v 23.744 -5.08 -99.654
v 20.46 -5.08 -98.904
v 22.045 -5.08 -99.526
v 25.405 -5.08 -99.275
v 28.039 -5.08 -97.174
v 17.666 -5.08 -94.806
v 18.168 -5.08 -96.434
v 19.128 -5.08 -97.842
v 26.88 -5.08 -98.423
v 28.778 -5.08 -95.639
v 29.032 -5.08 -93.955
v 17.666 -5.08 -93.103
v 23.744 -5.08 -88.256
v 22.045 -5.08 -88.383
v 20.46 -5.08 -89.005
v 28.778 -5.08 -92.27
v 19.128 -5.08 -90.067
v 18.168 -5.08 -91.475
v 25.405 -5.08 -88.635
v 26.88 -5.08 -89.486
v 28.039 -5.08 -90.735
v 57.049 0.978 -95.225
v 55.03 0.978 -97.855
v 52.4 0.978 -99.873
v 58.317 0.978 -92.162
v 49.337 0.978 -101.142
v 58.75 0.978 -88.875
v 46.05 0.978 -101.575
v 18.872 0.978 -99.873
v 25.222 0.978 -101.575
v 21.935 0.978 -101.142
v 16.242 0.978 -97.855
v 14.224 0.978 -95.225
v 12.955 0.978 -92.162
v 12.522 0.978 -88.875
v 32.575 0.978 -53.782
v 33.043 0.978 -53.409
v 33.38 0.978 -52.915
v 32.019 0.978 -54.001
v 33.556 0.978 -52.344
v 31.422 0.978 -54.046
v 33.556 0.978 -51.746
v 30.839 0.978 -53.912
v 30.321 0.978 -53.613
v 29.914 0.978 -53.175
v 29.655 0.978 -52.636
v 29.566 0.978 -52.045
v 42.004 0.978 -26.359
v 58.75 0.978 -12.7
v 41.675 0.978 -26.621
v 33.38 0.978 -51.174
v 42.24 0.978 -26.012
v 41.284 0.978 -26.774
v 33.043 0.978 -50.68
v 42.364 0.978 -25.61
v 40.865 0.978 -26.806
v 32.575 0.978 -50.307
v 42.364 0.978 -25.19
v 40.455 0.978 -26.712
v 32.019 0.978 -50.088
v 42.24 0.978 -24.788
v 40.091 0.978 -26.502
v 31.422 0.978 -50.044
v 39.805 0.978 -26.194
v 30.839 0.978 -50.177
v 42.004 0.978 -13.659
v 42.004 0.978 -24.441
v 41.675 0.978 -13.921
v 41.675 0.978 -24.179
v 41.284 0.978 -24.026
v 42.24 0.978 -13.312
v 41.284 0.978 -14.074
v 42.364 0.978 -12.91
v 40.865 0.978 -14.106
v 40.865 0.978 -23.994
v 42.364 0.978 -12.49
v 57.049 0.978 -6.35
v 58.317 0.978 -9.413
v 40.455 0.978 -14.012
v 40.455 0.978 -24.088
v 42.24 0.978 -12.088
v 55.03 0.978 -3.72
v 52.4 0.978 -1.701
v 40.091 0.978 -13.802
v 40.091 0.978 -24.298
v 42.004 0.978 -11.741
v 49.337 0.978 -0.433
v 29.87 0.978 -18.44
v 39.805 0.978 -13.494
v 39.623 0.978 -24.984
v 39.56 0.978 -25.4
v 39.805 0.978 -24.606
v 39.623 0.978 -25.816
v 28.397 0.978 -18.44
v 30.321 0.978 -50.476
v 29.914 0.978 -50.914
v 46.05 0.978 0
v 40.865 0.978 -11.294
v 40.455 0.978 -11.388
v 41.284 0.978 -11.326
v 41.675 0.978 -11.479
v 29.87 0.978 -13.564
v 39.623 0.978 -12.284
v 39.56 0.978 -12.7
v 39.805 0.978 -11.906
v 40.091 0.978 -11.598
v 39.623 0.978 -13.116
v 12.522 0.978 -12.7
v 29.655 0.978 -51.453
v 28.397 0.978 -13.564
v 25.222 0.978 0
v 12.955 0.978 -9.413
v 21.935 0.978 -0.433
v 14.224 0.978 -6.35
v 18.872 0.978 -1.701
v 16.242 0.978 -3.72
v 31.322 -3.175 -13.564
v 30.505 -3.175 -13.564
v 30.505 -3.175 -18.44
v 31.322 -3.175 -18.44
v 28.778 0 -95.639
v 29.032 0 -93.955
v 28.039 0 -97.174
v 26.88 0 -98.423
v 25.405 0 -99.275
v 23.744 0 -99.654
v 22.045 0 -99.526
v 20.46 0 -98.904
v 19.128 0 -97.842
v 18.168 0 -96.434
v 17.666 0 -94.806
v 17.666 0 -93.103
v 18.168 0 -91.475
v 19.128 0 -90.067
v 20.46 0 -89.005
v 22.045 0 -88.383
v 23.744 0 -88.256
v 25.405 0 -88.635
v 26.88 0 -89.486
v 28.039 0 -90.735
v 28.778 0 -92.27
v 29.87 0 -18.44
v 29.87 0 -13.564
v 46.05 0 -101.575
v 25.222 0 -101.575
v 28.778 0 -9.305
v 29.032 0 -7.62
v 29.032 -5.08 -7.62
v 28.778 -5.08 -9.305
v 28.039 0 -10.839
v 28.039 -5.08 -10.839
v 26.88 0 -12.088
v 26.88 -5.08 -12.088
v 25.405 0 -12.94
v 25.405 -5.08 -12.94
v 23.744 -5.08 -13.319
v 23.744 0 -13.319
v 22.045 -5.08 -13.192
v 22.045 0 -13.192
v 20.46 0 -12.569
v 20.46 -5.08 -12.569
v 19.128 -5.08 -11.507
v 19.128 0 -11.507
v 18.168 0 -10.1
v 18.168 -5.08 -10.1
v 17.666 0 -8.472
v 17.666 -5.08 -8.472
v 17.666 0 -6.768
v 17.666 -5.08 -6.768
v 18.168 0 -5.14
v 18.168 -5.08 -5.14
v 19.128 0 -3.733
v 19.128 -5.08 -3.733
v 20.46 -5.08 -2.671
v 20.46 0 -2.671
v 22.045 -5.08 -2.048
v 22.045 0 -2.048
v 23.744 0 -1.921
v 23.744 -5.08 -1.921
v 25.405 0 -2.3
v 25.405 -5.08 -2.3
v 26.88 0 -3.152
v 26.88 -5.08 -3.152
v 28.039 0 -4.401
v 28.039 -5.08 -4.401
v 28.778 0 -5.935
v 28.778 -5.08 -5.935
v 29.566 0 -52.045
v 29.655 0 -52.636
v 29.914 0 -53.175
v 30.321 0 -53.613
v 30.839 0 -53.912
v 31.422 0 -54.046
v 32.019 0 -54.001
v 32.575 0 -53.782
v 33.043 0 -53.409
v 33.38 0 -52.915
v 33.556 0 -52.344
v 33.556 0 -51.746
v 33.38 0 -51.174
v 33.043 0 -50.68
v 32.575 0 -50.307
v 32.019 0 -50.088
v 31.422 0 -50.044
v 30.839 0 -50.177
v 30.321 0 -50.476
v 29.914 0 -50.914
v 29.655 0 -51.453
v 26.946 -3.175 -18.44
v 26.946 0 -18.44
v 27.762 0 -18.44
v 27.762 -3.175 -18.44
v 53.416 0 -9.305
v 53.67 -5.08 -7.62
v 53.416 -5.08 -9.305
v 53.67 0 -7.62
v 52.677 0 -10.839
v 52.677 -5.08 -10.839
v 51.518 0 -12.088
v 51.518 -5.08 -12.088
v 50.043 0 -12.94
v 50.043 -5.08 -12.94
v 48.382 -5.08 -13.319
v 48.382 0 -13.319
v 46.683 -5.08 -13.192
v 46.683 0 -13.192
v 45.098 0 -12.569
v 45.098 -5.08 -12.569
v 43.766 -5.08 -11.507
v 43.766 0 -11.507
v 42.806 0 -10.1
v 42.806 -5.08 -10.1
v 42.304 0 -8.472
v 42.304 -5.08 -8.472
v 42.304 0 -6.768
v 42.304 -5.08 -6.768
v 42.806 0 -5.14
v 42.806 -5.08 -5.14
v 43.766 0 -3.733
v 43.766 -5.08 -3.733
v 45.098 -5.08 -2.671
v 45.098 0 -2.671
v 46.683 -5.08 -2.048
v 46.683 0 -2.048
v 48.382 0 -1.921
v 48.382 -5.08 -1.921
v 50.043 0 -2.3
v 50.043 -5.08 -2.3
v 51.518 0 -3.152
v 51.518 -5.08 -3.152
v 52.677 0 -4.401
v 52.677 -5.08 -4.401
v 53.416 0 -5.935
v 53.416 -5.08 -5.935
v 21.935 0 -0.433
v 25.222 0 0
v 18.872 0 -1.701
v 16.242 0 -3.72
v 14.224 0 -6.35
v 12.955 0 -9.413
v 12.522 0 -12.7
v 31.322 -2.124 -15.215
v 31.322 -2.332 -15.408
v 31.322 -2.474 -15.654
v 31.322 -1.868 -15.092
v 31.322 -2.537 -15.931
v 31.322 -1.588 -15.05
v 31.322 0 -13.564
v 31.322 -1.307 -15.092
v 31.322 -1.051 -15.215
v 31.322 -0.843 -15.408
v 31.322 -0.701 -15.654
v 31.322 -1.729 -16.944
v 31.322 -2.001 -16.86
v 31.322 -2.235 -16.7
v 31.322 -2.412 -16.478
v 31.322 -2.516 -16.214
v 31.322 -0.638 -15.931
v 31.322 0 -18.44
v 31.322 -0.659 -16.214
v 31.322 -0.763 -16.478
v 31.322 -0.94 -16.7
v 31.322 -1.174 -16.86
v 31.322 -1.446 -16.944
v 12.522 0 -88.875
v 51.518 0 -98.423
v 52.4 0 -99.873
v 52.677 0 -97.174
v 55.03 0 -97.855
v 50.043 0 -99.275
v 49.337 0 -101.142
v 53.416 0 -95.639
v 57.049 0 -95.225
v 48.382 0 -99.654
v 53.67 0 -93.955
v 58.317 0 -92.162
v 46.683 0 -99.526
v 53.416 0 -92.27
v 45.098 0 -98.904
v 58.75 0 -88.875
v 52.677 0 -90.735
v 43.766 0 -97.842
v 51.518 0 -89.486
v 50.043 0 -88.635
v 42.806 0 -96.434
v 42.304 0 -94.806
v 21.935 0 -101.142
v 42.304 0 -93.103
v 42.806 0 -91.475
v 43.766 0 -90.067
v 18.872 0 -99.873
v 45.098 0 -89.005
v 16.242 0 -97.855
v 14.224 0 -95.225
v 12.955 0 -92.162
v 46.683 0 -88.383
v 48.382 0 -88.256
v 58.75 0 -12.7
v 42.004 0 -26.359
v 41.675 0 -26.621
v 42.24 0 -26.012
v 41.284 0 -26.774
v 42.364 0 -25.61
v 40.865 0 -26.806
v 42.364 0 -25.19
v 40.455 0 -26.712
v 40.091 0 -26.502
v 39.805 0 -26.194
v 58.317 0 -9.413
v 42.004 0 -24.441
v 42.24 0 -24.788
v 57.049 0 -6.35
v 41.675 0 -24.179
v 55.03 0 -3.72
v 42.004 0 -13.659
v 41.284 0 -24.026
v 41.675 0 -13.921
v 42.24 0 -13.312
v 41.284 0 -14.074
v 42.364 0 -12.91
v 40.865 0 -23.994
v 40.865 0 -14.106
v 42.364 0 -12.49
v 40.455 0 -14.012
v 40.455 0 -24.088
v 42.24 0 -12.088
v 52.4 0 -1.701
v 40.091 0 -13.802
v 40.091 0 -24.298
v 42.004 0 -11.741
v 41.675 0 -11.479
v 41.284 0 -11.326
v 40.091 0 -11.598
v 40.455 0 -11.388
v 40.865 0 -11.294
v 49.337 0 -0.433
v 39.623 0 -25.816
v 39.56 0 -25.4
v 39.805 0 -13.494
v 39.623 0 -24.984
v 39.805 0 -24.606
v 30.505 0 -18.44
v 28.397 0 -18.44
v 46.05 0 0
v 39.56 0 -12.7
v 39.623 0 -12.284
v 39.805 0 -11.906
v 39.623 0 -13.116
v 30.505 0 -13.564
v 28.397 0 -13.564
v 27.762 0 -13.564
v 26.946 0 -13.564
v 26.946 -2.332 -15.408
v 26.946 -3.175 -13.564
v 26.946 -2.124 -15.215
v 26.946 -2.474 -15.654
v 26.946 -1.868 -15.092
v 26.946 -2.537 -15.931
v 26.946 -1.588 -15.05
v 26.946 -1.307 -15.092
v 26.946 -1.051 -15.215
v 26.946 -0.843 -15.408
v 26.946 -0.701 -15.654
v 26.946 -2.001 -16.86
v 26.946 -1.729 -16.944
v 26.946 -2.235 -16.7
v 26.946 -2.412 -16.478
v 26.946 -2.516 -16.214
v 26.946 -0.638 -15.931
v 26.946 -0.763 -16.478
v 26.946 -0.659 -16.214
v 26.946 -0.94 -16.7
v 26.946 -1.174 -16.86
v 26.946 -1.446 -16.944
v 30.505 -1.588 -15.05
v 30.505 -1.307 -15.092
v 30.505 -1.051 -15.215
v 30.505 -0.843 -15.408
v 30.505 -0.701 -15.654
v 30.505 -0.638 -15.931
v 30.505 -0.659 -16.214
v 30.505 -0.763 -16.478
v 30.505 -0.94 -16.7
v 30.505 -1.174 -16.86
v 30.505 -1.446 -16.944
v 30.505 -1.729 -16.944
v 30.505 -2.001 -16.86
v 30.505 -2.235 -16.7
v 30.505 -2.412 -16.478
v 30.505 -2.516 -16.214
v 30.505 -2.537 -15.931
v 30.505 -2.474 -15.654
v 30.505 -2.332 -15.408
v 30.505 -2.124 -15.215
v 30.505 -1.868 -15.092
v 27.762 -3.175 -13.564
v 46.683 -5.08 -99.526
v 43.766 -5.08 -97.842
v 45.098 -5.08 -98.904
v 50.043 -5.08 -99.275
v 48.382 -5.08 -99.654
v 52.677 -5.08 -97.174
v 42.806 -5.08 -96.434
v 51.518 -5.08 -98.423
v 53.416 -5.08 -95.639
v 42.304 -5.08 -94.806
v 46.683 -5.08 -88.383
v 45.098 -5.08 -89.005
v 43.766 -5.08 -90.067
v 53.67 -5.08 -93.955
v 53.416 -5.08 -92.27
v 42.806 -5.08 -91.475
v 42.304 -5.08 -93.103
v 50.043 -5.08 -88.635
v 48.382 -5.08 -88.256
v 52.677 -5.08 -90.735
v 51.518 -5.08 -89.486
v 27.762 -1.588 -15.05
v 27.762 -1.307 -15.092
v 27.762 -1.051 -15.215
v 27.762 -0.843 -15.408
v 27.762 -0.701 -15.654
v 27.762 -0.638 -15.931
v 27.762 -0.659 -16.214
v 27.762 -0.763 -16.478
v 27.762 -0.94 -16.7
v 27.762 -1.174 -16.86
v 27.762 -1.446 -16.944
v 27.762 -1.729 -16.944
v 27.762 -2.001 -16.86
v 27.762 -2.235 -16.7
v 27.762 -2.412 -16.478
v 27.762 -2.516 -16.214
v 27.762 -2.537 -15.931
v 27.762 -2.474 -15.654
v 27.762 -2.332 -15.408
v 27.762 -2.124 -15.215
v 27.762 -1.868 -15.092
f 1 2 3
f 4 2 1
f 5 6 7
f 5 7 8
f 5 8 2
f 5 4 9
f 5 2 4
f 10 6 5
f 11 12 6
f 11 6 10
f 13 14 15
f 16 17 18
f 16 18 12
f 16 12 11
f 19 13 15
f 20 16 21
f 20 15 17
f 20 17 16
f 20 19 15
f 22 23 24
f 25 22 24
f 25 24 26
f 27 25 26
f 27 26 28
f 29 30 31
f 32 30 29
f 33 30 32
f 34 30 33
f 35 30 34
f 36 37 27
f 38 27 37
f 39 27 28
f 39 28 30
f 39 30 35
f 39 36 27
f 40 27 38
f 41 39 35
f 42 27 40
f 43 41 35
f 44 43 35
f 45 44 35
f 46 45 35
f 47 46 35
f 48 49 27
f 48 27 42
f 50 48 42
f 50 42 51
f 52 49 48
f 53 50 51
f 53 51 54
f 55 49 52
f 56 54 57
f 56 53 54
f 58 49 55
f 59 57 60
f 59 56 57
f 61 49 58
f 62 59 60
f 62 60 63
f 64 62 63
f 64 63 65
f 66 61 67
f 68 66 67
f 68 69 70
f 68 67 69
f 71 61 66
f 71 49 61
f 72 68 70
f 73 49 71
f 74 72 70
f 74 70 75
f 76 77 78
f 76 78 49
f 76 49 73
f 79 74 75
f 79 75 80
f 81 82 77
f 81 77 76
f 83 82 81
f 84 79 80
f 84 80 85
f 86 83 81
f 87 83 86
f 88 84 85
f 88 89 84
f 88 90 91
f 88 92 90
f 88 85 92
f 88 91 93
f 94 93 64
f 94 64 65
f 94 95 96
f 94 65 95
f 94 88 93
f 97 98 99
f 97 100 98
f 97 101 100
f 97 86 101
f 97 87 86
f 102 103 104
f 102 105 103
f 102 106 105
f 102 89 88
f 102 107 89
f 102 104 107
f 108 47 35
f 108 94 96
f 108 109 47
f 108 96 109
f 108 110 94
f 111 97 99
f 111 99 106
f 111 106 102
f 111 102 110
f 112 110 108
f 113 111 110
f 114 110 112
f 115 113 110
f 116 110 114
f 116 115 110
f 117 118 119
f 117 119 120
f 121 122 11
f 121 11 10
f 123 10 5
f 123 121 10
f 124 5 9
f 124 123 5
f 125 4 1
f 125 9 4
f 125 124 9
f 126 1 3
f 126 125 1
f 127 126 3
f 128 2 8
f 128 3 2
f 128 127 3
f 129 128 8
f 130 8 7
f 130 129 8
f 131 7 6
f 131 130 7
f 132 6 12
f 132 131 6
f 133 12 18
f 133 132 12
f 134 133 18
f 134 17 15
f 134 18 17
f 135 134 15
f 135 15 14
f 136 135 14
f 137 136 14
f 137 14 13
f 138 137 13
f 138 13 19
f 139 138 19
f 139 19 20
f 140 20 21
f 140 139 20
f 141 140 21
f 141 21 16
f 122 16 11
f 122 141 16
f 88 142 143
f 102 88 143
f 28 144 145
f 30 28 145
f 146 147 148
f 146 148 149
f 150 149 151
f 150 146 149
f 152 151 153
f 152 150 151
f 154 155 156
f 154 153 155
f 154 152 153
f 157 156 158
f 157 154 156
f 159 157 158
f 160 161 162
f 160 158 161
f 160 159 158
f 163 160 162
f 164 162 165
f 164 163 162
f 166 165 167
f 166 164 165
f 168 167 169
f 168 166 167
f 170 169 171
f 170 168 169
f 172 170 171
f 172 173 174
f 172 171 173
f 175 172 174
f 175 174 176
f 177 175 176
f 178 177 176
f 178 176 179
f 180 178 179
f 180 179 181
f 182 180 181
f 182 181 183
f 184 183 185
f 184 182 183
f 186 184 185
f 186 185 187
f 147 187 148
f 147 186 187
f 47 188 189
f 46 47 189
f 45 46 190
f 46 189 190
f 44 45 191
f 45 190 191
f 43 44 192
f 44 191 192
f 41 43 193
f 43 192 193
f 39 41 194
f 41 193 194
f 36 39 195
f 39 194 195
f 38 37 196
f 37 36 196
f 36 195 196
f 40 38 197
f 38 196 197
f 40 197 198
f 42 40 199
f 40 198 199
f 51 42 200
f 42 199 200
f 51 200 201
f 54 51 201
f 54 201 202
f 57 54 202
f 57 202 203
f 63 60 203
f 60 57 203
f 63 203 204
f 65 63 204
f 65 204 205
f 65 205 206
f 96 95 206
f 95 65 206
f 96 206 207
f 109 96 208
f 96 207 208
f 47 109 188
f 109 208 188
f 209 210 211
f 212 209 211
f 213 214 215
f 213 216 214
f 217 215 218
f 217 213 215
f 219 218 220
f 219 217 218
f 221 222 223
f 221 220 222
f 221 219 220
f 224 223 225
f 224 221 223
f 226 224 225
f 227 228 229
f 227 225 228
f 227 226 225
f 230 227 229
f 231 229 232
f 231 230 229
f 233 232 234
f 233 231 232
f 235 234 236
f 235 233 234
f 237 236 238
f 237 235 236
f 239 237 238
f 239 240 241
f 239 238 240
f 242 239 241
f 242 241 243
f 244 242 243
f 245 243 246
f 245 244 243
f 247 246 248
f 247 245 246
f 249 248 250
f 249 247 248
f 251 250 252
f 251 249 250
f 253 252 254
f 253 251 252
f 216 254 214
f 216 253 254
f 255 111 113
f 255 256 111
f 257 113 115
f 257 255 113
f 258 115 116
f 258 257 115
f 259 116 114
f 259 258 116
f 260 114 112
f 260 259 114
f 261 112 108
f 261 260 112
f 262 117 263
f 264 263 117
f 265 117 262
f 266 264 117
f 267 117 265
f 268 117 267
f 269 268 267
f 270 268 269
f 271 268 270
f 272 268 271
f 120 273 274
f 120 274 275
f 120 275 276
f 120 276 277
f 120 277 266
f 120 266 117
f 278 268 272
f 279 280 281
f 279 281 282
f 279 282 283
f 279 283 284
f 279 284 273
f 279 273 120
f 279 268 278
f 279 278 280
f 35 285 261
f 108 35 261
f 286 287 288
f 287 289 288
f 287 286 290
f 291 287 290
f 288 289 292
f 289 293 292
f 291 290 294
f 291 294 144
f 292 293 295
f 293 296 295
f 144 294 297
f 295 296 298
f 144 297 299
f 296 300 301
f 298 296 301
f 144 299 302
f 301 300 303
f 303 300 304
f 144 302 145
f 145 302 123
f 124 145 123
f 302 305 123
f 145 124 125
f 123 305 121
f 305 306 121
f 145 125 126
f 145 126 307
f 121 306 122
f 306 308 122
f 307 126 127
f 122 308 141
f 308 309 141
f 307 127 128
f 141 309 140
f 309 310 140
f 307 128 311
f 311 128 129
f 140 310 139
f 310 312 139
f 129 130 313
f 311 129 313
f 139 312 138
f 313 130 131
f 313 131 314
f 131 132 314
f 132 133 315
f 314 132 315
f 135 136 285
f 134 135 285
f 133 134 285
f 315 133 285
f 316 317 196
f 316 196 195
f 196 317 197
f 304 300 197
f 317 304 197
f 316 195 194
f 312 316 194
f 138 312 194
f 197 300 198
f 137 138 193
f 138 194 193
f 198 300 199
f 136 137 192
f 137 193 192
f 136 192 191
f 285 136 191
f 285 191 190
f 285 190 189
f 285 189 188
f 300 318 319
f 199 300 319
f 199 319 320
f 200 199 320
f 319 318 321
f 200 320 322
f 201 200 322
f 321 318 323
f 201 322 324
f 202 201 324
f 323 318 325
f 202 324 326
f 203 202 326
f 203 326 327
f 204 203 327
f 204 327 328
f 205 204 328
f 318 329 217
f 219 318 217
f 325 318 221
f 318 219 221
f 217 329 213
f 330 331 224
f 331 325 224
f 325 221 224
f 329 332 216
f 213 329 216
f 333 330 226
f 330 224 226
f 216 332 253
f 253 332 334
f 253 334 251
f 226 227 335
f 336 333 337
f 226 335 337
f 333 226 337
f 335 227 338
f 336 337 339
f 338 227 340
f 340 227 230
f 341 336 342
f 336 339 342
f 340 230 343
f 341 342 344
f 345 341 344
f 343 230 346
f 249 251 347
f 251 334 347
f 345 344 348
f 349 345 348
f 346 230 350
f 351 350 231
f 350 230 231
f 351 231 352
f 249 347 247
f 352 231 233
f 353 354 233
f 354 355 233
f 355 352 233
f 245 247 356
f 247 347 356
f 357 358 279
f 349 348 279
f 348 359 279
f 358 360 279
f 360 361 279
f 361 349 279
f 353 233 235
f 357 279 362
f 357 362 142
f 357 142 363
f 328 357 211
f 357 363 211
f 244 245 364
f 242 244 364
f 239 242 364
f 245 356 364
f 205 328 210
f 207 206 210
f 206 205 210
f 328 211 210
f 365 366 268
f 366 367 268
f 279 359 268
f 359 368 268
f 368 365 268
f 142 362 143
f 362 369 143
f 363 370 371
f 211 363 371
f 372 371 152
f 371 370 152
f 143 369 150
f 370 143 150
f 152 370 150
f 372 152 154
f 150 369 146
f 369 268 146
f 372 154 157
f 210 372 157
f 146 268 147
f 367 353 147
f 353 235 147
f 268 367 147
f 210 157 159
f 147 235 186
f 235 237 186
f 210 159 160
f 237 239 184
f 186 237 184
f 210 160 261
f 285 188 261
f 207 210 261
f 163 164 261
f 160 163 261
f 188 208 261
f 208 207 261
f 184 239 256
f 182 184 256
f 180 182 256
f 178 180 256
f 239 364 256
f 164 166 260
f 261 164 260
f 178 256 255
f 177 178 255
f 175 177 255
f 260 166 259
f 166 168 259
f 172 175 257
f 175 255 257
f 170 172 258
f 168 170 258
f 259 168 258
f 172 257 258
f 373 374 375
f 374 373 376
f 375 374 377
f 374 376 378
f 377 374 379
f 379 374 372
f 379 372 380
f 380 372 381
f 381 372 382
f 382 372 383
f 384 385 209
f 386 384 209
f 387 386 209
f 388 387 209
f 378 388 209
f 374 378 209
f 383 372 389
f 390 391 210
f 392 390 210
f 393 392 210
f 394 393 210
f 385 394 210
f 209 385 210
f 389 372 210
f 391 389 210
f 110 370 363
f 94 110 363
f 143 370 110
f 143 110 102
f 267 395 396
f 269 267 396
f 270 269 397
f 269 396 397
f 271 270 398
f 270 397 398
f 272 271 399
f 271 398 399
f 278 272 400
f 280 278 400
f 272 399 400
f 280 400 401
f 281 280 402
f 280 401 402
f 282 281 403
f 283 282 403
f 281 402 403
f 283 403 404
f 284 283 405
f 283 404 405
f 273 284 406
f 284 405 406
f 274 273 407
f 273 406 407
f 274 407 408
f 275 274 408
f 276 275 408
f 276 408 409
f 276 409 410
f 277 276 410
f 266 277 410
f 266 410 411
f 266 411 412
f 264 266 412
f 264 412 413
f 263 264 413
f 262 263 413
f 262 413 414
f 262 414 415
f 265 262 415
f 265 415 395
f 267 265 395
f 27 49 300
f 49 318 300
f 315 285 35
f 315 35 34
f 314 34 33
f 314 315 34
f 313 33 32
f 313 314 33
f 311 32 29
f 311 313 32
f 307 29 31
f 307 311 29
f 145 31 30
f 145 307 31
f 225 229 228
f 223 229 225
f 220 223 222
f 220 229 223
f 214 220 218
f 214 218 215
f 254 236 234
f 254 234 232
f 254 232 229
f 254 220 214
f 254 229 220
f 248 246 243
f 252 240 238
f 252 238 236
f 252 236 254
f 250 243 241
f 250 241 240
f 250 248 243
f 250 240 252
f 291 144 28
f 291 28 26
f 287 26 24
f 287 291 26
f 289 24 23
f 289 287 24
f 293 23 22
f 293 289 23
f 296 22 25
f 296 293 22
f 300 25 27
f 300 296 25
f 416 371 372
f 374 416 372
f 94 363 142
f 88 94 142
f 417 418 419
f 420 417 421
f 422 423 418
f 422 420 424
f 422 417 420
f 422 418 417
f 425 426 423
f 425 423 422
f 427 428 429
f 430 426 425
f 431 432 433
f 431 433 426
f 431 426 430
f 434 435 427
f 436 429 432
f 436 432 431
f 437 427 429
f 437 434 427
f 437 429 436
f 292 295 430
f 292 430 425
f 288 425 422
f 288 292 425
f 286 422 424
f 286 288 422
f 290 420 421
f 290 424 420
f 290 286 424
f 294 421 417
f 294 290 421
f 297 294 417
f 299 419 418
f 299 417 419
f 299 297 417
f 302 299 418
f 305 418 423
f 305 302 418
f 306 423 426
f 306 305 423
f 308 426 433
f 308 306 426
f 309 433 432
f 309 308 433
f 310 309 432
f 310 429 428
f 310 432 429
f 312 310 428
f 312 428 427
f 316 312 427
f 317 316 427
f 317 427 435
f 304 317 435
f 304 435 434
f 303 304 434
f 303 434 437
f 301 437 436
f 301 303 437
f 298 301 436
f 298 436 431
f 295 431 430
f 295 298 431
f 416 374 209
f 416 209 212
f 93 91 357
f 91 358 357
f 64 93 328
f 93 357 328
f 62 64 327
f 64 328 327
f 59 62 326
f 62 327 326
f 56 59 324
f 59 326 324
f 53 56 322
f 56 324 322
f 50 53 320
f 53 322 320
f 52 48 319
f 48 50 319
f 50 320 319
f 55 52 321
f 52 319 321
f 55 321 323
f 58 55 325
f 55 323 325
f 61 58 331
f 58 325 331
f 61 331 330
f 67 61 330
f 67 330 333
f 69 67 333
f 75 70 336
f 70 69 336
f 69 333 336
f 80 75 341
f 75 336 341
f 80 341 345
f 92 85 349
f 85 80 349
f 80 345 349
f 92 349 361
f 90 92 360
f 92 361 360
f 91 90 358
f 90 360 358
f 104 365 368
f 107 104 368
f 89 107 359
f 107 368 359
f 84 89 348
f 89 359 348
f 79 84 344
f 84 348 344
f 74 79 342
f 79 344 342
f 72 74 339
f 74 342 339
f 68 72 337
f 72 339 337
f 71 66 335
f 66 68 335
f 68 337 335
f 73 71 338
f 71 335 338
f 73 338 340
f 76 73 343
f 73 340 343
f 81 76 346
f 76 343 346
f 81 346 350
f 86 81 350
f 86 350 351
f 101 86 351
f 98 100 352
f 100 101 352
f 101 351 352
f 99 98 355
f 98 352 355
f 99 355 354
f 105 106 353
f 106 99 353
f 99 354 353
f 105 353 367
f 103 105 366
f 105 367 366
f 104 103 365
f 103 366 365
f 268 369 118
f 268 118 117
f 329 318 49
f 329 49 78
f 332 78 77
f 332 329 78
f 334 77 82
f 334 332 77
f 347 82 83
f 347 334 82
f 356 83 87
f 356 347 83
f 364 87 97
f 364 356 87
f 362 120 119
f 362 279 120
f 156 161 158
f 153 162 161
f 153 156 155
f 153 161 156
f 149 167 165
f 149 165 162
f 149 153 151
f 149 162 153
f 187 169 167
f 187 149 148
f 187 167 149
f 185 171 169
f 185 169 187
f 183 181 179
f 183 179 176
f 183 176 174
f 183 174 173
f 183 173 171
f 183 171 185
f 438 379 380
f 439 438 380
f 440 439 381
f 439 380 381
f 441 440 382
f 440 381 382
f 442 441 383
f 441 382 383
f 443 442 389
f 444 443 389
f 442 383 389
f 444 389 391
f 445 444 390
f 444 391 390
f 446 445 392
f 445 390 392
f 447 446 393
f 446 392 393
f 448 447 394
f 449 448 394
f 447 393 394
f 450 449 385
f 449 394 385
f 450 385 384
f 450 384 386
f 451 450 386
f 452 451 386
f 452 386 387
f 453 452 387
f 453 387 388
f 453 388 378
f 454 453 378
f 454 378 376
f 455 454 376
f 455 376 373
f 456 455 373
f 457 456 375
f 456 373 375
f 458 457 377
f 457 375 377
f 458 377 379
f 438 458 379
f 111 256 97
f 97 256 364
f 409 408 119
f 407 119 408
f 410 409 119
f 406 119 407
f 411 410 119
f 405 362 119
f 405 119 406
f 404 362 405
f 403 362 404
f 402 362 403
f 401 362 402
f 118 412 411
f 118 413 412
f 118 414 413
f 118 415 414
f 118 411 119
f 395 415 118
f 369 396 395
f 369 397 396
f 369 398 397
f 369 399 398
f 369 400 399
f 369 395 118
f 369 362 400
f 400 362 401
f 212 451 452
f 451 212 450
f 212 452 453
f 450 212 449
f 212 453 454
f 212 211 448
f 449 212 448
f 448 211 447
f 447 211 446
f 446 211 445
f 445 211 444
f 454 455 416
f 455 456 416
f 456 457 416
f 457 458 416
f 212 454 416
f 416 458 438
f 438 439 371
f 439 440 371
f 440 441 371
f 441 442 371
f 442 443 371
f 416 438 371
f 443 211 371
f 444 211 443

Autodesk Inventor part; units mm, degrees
ref_plane "YZ Plane" through (0, 0, 0) normal (1, 0, 0) x (0, 1, 0)
ref_plane "XZ Plane" through (0, 0, 0) normal (0, 1, 0) x (-1, 0, 0)
ref_plane "XY Plane" through (0, 0, 0) normal (0, 0, 1) x (1, 0, 0)
sketch "Sketch1" plane through (0, 0, 0) normal (0, 1, 0) x (-1, 0, 0)
  line L0 (-25.2222, 0) -> (-46.0502, 0)
  line L1 (-58.7502, -12.7) -> (-58.7502, -88.8746)
  line L2 (-46.0502, -101.5746) -> (-25.2222, -101.5746)
  line L3 (-12.5222, -88.8746) -> (-12.5222, -12.7)
  arc A0 (-12.5222, -12.7) -> (-25.2222, 0) centre (-25.2222, -12.7) ccw
  arc A1 (-46.0502, 0) -> (-58.7502, -12.7) centre (-46.0502, -12.7) ccw
  arc A2 (-58.7502, -88.8746) -> (-46.0502, -101.5746) centre (-46.0502, -88.8746) ccw
  arc A3 (-25.2222, -101.5746) -> (-12.5222, -88.8746) centre (-25.2222, -88.8746) ccw
  circle A4 centre (-31.5722, -52.0446) radius 2.0066
  line L4 (-28.3972, -13.5636) -> (-29.8704, -13.5636)
  line L5 (-28.3972, -13.5636) -> (-28.3972, -18.4404)
  line L6 (-28.3972, -18.4404) -> (-29.8704, -18.4404)
  line L7 (-29.8704, -18.4404) -> (-29.8704, -13.5636)
  circle A5 centre (-40.9702, -12.7) radius 1.4097
  circle A6 centre (-40.9702, -25.4) radius 1.4097
  point P0 (0, 0)
  dimension "d1" = 101.5746
  dimension "d2" = 12.7
  dimension "d3" = 12.7
  dimension "d4" = 12.7
  dimension "d5" = 12.7
  dimension "d6" = 12.7
  dimension "d7" = 12.7
  dimension "d8" = 12.7
  dimension "d9" = 12.7
  dimension "d10" = 46.228
  dimension "d11" = 19.05
  dimension "d12" = 49.53
  dimension "d13" = 4.0132
  dimension "d14" = 1.4732
  dimension "d15" = 13.5636
  dimension "d16" = 4.8768
  dimension "d17" = 15.875
  dimension "d18" = 12.7
  dimension "d19" = 17.78
  dimension "d20" = 12.7
  dimension "d21" = 2.8194
  dimension "d22" = 2.8194
extrude "Extrusion1" add sketch "Sketch1" along normal blind 0.9779
sketch "Sketch2" plane through (0, 0, 0) normal (0, -1, 0) x (1, 0, 0)
  line L0 (58.7502, -88.8746) -> (58.7502, -12.7) projected
  line L1 (46.0502, 0) -> (25.2222, 0) projected
  circle A0 centre (47.9552, -7.62) radius 5.715
  line L2 (12.5222, -12.7) -> (12.5222, -88.8746) projected
  circle A1 centre (23.3172, -7.62) radius 5.715
  line L3 (25.2222, -101.5746) -> (46.0502, -101.5746) projected
  circle A2 centre (47.9552, -93.9546) radius 5.715
  circle A3 centre (23.3172, -93.9546) radius 5.715
  line L4 (29.8704, -13.5636) -> (29.8704, -18.4404) projected
  line L5 (31.1404, -17.3228) -> (33.274, -17.3228)
  line L6 (33.274, -17.3228) -> (33.274, -22.1996)
  line L7 (33.274, -22.1996) -> (31.1404, -22.1996)
  line L8 (31.1404, -22.1996) -> (31.1404, -17.3228)
  line L9 (29.8704, -13.5636) -> (28.3972, -13.5636) projected
  line L10 (29.8704, -18.4404) -> (28.3972, -18.4404) projected
  line L11 (25.0952, -17.3228) -> (22.9616, -17.3228)
  line L12 (22.9616, -17.3228) -> (22.9616, -22.1996)
  line L13 (22.9616, -22.1996) -> (25.0952, -22.1996)
  line L14 (25.0952, -22.1996) -> (25.0952, -17.3228)
  point P0 (0, 0)
  dimension "d25" = 10.795
  dimension "d26" = 7.62
  dimension "d27" = 11.43
  dimension "d28" = 10.795
  dimension "d29" = 11.43
  dimension "d30" = 7.62
  dimension "d31" = 11.43
  dimension "d32" = 11.43
  dimension "d33" = 1.27
  dimension "d34" = 2.1336
extrude "Extrusion2" add sketch "Sketch2" along normal blind 5.08 contours A0 | A1 | A2 | A3
sketch "Sketch3" plane through (0, 0, 0) normal (0, -1, 0) x (1, 0, 0)
  line L0 (30.5054, -13.5636) -> (31.3218, -13.5636)
  line L1 (31.3218, -13.5636) -> (31.3218, -18.4404)
  line L2 (31.3218, -18.4404) -> (30.5054, -18.4404)
  line L3 (30.5054, -18.4404) -> (30.5054, -13.5636)
  line L4 (29.8704, -13.5636) -> (29.8704, -18.4404) projected
  line L5 (28.3972, -18.4404) -> (28.3972, -13.5636) projected
  line L6 (29.1338, -12.4667) -> (29.1338, -19.0142)
  line L7 (27.7622, -13.5636) -> (26.9458, -13.5636)
  line L8 (26.9458, -13.5636) -> (26.9458, -18.4404)
  line L9 (26.9458, -18.4404) -> (27.7622, -18.4404)
  line L10 (27.7622, -18.4404) -> (27.7622, -13.5636)
  point P0 (0, 0)
  dimension "d37" = 0.635
  dimension "d38" = 1.4732
  dimension "d39" = 0.7366
extrude "Extrusion3" add sketch "Sketch3" along normal blind 3.175
sketch "Sketch4" plane through (26.9458, 0, -18.4404) normal (-1, 0, 0) x (0, 0, 1)
  line L0 (0, 0) -> (0, -3.175) projected
  line L1 (4.8768, 0) -> (4.8768, -3.175) projected
  line L2 (4.8768, -3.175) -> (0, -3.175) projected
  line L3 (5.7404, 0) -> (-70.4342, 0) projected
  circle A0 centre (2.4384, -1.5875) radius 0.9525
  point P0 (18.4404, 0)
  dimension "d42" = 2.4384
  dimension "d43" = 4.8768
  dimension "d44" = 1.5875
  dimension "d45" = 3.175
  dimension "d46" = 1.905
extrude "Extrusion4" cut sketch "Sketch4" against normal through all contours A0
properties part number "base" material "Aluminum 6061"
